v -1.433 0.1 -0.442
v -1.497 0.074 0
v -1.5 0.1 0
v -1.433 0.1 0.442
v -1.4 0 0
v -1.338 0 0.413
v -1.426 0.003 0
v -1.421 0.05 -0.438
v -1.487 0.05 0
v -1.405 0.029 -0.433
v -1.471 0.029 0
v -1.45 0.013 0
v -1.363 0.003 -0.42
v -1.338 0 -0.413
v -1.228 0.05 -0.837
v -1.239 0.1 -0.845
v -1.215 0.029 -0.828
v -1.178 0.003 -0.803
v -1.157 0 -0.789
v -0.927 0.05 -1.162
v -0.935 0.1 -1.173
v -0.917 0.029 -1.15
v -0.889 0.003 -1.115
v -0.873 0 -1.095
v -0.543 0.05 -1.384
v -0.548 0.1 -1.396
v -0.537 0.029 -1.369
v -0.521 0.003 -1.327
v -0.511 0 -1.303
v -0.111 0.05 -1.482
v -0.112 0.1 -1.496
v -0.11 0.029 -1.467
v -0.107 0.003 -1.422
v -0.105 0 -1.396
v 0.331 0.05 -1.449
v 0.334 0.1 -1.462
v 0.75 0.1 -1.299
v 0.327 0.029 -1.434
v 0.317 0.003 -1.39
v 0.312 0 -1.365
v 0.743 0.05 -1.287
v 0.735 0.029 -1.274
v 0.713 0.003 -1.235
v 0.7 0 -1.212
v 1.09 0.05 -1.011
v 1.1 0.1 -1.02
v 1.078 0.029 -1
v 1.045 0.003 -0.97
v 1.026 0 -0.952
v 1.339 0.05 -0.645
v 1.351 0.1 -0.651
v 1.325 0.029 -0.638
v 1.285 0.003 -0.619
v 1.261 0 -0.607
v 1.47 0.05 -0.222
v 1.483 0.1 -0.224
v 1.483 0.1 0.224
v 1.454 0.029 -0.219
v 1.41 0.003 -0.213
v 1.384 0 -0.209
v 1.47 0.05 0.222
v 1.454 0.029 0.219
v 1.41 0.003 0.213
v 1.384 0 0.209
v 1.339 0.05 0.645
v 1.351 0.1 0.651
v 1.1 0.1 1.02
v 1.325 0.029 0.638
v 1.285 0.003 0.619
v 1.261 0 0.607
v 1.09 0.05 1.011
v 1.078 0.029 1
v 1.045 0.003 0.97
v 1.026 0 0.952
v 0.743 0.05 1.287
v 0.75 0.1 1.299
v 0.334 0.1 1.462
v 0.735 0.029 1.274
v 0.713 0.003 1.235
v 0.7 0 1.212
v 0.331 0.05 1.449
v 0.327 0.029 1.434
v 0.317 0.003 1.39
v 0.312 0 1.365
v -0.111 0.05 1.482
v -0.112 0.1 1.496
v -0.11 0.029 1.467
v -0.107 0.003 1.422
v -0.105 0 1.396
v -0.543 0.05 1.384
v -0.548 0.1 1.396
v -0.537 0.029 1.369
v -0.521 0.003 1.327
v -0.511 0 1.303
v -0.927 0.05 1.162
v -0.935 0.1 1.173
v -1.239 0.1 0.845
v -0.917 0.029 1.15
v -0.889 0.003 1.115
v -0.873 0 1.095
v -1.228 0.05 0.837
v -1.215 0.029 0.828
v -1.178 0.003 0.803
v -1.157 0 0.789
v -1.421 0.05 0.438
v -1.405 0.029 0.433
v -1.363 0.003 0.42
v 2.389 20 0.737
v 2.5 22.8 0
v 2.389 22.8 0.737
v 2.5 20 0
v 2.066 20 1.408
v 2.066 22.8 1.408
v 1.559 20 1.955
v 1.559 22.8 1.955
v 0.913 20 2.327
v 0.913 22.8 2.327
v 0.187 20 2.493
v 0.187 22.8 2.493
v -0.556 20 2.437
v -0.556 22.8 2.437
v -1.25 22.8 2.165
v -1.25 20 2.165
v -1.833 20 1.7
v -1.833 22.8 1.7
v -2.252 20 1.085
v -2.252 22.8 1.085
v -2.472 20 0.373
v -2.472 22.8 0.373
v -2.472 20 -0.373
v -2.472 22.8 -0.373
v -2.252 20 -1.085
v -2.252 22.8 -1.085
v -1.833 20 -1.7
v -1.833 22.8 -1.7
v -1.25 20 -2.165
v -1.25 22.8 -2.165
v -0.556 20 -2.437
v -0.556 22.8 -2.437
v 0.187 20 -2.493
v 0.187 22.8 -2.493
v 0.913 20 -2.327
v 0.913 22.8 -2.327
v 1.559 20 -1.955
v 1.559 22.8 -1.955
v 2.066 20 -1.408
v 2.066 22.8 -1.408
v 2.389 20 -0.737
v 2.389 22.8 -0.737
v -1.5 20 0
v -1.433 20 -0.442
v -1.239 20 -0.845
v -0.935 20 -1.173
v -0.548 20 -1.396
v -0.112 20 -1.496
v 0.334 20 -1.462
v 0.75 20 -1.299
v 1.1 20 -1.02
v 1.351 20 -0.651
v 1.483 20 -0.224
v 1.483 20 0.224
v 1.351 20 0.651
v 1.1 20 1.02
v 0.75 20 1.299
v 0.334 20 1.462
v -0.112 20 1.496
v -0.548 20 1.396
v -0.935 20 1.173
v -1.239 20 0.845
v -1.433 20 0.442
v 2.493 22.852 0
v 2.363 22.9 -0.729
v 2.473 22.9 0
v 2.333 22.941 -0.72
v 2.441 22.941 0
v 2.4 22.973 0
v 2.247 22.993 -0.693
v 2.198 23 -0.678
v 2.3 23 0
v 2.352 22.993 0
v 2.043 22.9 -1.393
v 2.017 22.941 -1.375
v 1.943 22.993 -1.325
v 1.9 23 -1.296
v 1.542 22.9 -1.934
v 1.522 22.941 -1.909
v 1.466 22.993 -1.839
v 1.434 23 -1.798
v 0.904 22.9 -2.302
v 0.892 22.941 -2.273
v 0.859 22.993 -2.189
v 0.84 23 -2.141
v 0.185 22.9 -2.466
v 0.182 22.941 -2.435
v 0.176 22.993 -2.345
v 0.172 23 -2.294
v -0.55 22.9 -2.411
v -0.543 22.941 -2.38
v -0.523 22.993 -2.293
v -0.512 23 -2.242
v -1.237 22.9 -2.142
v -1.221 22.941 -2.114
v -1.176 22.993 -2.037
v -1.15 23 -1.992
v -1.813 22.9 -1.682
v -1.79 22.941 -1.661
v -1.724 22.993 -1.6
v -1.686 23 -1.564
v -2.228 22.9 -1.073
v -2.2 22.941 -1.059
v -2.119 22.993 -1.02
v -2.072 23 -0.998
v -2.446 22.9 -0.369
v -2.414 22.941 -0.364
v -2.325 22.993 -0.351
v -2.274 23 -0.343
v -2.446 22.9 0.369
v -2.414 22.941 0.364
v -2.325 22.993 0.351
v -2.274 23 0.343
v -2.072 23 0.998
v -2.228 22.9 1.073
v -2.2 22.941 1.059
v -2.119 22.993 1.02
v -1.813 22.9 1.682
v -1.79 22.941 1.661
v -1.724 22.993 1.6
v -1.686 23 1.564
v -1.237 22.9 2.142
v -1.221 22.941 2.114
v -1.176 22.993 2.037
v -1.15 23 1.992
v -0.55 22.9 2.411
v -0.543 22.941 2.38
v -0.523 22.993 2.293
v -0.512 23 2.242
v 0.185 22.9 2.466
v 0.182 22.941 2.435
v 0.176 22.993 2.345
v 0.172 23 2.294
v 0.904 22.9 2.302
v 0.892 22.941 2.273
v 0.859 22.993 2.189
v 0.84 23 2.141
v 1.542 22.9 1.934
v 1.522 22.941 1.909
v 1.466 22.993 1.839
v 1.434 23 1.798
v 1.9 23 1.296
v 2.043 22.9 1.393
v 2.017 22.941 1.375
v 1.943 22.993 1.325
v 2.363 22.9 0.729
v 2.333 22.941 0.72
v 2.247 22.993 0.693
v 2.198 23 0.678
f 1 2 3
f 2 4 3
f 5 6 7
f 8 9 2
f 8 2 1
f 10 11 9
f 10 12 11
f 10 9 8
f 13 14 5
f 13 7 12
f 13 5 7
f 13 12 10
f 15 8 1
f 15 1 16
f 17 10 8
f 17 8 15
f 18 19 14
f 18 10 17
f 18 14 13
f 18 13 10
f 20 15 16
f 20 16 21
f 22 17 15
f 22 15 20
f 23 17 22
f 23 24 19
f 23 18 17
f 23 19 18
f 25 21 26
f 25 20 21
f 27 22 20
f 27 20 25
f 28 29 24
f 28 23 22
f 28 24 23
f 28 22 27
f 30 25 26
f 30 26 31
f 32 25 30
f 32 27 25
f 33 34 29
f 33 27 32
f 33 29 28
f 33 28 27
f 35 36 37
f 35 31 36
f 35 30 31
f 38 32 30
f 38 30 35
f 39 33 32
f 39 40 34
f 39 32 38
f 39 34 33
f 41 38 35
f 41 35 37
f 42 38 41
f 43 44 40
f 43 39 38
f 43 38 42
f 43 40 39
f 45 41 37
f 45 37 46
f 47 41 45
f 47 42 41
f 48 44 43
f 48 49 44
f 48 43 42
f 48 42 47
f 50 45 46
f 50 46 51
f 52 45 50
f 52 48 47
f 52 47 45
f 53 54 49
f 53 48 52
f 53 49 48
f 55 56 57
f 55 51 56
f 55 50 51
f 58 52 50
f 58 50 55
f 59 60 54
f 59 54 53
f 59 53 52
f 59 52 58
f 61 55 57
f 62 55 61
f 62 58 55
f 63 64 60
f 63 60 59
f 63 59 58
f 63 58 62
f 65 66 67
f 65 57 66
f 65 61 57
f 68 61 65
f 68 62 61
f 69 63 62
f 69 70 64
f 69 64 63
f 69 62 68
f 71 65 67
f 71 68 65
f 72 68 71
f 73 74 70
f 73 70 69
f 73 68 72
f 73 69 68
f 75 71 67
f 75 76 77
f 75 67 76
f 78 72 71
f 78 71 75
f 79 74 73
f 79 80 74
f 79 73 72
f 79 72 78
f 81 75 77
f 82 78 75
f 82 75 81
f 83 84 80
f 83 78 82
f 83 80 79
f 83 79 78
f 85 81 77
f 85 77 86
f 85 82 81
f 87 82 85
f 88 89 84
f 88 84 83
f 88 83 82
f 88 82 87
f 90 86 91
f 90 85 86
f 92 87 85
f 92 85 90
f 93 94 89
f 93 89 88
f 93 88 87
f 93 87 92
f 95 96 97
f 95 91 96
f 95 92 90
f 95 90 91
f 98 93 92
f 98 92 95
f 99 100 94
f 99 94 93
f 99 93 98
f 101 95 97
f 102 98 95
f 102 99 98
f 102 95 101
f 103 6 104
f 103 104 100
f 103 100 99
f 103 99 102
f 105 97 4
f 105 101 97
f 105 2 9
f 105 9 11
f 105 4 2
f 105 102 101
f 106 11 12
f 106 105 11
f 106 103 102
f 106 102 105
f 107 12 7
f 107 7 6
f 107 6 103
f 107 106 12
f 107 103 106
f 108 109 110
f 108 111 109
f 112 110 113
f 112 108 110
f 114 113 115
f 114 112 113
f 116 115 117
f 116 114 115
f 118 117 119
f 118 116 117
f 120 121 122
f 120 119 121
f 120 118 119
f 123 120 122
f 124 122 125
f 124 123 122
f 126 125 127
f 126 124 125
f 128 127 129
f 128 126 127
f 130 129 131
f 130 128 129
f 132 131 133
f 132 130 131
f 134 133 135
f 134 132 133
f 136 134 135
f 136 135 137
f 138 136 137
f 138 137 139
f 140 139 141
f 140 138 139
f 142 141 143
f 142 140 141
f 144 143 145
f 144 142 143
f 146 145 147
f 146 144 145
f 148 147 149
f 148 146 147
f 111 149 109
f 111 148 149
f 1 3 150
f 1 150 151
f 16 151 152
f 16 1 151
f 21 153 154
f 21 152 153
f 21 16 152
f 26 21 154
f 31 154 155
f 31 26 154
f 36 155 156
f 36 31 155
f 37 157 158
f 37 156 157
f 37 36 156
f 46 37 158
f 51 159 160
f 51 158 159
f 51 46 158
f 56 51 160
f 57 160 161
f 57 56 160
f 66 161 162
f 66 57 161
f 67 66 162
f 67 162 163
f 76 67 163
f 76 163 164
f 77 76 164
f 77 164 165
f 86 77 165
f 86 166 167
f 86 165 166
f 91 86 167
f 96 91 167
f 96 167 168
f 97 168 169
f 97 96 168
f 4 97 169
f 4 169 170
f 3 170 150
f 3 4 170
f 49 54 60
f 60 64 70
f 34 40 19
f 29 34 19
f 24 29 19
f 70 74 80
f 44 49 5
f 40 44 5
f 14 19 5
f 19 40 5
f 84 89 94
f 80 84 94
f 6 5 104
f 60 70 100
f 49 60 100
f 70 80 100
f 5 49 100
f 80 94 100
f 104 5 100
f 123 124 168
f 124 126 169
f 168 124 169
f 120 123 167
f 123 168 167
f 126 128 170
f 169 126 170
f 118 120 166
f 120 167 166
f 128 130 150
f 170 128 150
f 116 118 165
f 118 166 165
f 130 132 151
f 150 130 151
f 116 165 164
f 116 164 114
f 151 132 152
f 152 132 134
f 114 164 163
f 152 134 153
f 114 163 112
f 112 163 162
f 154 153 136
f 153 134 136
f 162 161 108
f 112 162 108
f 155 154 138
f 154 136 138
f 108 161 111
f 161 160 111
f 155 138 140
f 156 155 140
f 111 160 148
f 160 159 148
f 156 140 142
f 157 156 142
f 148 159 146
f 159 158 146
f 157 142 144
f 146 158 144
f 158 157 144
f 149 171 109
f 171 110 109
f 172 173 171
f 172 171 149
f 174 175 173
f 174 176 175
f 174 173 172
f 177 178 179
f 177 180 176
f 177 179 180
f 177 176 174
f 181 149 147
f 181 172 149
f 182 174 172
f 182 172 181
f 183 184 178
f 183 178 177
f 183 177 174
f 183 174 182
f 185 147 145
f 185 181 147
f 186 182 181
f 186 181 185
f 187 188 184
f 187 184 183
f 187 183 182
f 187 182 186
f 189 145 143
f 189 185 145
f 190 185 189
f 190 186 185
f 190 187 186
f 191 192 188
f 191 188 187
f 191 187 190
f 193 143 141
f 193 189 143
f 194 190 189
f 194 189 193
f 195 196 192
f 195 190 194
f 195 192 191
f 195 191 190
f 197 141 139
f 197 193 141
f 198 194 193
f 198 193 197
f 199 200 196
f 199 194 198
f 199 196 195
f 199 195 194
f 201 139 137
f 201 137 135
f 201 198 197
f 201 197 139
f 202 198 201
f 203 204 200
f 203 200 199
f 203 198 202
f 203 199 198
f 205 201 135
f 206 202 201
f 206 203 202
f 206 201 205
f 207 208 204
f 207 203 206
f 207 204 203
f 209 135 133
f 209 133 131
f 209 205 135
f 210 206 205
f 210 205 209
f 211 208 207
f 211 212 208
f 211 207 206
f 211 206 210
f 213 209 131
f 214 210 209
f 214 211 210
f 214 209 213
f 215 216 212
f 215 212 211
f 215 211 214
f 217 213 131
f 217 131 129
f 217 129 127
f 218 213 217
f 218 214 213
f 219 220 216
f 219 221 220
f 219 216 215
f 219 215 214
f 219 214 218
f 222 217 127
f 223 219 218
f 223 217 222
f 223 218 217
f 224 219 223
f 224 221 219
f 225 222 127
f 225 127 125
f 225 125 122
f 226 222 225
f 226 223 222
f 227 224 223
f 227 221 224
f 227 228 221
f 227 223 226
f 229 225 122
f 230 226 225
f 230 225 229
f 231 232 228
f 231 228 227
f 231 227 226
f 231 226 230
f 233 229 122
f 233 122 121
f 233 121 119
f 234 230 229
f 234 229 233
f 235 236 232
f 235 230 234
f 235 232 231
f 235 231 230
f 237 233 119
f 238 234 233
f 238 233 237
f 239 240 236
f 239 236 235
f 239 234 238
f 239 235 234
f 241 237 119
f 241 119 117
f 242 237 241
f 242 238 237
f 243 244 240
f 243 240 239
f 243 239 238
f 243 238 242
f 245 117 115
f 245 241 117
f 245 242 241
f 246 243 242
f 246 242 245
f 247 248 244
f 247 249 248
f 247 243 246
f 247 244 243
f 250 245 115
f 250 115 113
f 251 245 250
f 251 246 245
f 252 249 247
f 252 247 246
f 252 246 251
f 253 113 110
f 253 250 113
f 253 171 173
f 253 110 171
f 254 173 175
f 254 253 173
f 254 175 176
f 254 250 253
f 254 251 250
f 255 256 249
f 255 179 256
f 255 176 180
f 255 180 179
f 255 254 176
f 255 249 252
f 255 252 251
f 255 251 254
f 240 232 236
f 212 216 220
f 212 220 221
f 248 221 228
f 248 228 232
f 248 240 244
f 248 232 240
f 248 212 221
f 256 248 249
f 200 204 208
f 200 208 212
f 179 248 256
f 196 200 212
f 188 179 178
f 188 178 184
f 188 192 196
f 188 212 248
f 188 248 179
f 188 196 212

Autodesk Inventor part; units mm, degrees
ref_plane "YZ Plane" through (0, 0, 0) normal (1, 0, 0) x (0, 1, 0)
ref_plane "XZ Plane" through (0, 0, 0) normal (0, 1, 0) x (-1, 0, 0)
ref_plane "XY Plane" through (0, 0, 0) normal (0, 0, 1) x (1, 0, 0)
sketch "Sketch1" plane through (0, 0, 0) normal (0, 1, 0) x (-1, 0, 0)
  circle A0 centre (0, 0) radius 1.5
  dimension "d0" = 3
extrude "Extrusion1" add sketch "Sketch1" along normal blind 20
sketch "Sketch2" plane through (0, 20, 0) normal (0, 1, 0) x (1, 0, 0)
  circle A0 centre (0, 0) radius 2.5
  dimension "d3" = 5
extrude "Extrusion2" add sketch "Sketch2" along normal blind 3
fillet "Fillet1" radius 0.2 1 edges at (-2.5, 23, 0)
fillet "Fillet2" radius 0.1 1 edges at (1.5, 0, 0)
properties part number "VIS"
